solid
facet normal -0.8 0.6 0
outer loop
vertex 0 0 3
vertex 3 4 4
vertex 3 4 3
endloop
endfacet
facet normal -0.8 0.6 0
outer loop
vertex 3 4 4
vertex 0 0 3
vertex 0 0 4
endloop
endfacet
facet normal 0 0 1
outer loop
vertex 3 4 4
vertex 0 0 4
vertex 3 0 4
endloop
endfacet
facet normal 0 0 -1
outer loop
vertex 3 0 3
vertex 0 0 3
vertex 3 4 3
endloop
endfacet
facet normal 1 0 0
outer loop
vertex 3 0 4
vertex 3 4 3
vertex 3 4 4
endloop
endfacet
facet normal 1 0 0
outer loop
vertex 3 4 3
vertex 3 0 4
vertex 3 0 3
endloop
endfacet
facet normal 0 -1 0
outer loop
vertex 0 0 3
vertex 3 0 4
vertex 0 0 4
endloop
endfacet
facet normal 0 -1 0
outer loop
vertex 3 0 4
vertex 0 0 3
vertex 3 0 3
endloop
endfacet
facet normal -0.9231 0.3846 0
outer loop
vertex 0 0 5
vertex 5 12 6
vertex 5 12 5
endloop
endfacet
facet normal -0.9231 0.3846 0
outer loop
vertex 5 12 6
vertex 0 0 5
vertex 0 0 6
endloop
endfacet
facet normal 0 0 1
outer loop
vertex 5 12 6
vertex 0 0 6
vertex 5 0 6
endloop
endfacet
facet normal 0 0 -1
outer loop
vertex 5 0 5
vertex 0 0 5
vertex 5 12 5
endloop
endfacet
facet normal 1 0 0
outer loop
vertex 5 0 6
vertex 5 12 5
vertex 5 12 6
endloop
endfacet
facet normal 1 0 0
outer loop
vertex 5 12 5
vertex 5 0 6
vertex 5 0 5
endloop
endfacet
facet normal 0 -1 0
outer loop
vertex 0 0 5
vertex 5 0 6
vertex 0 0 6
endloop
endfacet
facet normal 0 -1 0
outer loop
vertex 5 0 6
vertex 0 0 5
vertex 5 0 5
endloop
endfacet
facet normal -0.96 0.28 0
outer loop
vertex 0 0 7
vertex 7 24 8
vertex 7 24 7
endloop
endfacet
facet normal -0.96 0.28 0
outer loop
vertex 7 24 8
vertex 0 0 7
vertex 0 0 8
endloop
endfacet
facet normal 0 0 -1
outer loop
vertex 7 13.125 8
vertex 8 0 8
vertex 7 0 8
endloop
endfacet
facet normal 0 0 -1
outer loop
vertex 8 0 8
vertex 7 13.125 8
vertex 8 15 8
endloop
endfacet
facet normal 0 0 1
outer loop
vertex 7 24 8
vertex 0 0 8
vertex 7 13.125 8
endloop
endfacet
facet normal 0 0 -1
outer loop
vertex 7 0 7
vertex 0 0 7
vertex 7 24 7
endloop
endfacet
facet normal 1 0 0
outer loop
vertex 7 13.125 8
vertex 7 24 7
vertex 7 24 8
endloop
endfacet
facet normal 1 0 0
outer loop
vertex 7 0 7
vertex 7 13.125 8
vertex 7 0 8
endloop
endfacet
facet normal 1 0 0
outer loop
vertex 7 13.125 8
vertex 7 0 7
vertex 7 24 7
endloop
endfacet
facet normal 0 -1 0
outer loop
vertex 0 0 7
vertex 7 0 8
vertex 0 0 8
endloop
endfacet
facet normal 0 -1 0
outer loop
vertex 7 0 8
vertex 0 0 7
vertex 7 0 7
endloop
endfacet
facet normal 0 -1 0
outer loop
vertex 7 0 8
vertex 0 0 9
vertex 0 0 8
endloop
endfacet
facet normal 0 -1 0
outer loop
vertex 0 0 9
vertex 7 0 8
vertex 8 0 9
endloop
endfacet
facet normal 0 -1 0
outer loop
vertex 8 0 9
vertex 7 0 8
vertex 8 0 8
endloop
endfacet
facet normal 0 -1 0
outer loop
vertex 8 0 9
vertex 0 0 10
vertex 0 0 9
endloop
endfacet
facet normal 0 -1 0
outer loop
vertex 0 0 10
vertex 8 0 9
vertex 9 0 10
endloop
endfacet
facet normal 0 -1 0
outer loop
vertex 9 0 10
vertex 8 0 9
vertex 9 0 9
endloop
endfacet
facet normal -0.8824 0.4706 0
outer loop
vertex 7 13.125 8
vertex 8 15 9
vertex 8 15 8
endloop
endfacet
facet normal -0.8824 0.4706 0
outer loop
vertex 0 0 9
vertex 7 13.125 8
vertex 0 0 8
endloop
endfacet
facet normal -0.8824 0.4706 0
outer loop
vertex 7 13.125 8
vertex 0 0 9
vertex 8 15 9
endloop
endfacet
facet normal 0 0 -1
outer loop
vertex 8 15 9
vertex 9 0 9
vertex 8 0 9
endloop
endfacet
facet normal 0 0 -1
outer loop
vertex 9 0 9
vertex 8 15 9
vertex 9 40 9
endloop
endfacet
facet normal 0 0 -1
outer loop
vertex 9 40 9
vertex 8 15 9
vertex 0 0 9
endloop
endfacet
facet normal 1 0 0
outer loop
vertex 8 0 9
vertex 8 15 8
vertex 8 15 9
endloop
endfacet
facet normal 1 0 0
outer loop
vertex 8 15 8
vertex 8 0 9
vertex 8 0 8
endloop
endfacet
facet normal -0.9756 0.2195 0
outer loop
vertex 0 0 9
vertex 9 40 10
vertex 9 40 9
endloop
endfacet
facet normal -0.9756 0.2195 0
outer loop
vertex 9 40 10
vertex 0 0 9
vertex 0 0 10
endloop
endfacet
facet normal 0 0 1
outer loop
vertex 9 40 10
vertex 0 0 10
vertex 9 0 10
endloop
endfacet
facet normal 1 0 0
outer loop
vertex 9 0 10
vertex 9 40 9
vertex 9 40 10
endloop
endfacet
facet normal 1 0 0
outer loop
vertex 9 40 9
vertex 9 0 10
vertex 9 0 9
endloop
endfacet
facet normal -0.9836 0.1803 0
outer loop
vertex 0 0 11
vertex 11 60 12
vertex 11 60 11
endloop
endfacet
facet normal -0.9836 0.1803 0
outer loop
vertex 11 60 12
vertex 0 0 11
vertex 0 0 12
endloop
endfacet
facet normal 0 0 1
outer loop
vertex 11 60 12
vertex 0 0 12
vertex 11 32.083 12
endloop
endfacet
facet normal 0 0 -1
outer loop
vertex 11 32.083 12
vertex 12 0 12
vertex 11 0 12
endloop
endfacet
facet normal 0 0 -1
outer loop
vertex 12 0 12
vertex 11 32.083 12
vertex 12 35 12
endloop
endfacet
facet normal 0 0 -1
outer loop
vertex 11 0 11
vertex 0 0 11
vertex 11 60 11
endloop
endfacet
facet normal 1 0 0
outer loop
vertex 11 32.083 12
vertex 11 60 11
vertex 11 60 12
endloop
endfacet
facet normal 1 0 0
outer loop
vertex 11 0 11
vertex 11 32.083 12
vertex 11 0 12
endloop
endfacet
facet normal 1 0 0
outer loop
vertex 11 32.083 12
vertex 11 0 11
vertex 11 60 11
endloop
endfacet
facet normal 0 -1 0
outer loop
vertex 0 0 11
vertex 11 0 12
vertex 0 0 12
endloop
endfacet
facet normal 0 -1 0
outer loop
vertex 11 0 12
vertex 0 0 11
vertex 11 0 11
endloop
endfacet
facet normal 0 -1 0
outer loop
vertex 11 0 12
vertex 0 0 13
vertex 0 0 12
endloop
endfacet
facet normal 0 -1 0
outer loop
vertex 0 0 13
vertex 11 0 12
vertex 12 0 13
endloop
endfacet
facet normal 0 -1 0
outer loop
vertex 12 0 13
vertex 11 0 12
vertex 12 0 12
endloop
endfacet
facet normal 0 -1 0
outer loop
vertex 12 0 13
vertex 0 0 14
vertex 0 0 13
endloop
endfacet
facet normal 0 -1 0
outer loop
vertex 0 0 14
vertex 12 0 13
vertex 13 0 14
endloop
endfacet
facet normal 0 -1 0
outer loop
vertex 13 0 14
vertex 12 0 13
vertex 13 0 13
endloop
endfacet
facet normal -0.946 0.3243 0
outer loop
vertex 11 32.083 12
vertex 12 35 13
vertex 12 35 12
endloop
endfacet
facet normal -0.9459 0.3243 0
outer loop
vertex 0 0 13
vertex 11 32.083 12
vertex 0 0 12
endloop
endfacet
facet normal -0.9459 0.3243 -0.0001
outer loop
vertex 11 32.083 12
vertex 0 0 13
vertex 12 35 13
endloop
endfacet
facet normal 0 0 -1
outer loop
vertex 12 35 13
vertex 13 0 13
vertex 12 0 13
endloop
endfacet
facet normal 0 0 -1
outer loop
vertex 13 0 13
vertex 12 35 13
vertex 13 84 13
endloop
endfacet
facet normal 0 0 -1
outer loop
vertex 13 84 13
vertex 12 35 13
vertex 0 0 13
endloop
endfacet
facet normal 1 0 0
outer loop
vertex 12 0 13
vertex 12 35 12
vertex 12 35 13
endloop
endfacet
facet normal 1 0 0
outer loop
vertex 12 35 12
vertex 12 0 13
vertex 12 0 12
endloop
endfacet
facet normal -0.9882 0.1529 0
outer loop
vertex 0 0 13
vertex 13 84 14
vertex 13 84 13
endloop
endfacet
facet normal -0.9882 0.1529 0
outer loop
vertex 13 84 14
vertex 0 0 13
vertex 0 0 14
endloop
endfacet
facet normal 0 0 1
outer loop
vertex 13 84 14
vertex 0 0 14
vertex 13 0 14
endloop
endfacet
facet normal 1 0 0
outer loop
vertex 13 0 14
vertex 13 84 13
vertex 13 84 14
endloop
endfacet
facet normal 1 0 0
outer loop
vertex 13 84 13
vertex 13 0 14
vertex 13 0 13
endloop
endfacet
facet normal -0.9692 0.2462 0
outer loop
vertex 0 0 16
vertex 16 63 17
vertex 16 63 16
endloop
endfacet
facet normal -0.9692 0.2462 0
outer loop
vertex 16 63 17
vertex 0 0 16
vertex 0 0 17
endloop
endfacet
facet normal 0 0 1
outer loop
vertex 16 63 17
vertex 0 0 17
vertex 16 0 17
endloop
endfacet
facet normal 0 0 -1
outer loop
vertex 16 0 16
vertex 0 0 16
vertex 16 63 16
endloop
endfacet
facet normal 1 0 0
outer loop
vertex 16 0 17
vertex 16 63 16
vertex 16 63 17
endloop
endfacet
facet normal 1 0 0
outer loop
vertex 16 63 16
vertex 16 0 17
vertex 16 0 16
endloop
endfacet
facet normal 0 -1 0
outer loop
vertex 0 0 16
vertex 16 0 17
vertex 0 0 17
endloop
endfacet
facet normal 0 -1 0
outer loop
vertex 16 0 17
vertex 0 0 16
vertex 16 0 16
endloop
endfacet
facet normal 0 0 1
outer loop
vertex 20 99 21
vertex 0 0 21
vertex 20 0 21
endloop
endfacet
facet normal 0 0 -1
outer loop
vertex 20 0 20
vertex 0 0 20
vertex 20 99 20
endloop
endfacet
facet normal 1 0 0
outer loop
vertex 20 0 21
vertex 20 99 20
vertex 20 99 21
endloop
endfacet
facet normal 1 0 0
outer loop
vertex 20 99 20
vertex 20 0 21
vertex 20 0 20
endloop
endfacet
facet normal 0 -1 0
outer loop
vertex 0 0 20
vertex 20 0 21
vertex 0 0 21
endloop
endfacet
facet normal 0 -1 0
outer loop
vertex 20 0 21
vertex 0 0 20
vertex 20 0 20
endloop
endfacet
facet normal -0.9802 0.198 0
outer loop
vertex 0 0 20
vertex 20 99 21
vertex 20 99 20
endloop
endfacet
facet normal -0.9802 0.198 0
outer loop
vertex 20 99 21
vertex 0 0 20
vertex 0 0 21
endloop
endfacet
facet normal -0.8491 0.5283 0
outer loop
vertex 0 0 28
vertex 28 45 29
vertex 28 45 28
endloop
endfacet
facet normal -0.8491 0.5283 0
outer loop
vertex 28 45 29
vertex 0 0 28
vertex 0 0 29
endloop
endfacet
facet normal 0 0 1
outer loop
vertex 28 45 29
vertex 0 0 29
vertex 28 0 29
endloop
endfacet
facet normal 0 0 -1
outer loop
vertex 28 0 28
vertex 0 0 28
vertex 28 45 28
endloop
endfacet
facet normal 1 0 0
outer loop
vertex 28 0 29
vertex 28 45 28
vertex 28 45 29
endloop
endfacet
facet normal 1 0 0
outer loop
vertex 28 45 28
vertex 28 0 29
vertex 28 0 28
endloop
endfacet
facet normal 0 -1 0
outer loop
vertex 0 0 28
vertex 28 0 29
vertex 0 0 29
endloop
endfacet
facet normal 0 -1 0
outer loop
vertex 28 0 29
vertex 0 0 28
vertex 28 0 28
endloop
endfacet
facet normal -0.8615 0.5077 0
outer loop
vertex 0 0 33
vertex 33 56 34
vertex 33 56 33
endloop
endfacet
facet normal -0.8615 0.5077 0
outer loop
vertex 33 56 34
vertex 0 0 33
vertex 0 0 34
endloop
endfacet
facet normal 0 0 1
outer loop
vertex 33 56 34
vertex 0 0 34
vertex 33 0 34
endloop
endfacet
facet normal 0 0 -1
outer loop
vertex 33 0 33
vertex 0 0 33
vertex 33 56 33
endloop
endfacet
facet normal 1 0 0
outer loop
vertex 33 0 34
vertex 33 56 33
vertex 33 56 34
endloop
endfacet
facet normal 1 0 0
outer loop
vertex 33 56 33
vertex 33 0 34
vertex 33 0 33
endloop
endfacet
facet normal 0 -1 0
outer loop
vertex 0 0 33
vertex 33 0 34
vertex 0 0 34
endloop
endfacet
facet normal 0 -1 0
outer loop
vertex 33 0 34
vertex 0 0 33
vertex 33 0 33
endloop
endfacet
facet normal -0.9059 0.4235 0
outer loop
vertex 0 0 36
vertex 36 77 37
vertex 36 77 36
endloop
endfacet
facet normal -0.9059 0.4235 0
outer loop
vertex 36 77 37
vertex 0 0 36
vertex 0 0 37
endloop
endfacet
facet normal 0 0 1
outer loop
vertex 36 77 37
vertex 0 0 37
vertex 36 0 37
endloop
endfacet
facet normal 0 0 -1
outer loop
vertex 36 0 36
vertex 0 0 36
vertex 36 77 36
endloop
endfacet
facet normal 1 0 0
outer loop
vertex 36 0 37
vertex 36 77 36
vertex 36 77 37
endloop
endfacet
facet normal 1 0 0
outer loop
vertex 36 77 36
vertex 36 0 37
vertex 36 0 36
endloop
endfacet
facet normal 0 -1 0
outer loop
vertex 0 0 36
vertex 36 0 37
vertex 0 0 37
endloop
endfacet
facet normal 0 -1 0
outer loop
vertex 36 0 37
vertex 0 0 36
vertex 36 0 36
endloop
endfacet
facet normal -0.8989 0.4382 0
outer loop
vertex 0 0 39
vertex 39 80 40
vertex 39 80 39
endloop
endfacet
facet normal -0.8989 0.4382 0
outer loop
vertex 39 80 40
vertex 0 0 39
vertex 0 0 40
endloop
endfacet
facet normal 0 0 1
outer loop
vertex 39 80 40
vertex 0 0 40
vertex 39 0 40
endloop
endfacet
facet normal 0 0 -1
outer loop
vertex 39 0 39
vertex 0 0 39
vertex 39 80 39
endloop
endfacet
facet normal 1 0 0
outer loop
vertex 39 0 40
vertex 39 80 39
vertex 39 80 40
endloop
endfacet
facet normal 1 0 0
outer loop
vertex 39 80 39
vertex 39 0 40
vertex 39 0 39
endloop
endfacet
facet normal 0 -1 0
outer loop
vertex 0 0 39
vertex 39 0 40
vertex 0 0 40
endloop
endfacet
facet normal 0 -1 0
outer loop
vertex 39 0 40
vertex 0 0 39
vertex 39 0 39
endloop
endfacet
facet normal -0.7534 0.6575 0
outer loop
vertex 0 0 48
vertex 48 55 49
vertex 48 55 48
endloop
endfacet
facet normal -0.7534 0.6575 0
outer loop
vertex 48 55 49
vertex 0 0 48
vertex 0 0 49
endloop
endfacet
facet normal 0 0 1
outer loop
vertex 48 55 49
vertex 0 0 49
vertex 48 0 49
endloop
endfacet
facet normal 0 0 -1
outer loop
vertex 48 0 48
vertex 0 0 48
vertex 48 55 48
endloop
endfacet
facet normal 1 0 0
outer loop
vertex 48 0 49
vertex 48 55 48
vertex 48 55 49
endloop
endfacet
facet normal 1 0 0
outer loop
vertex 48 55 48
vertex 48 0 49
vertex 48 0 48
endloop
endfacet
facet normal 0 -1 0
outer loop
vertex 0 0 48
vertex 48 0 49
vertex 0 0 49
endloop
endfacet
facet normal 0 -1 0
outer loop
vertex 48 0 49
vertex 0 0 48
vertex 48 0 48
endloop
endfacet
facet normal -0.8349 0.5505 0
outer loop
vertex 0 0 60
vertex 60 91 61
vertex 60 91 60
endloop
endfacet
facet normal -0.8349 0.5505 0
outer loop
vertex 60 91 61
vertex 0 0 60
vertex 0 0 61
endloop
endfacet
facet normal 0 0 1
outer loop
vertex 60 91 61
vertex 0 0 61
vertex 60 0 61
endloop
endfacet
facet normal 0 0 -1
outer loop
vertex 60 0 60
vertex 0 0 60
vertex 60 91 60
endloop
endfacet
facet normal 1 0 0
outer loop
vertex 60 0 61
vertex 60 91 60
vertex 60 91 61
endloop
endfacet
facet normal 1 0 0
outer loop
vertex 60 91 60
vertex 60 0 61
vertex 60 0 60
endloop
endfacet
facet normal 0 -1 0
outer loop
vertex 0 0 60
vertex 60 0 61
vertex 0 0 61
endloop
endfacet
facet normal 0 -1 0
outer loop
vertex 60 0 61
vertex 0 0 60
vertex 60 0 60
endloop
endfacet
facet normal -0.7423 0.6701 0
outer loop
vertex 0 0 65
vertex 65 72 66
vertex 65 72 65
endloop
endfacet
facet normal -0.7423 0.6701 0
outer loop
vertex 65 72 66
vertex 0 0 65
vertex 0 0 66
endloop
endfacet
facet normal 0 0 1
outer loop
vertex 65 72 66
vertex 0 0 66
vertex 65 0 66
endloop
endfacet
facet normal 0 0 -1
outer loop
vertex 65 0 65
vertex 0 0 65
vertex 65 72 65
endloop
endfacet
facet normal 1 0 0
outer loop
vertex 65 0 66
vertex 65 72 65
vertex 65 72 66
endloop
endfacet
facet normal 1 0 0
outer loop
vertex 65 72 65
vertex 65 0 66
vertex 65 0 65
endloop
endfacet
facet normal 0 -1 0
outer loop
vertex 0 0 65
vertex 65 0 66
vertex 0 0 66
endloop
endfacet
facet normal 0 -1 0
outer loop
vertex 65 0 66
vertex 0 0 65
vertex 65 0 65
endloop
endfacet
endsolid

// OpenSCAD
// Pythagorean Triples

test_module="test pythagorean_triples";

function calc_factors(N) = [ for(i=[1:N]) if(N%i==0) i ];
    
function calc_common_factors(a,b) = [ for(fa=calc_factors(a),fb=calc_factors(b)) if(fa==fb) fa ];
    
function pythagorean_triples(N=10) = [ for (i=[1:N],j=[i:N]) if(len(calc_common_factors(i,j))==1 && sqrt(pow(i,2)+pow(j,2))%1==0) [i,j] ];
    
function pythagorean_triples_angles(N=10) = [ for (pair=pythagorean_triples(N=N)) [ atan2(pair[0],pair[1]),atan2(pair[1],pair[0]) ] ];
    
if(test_module=="test pythagorean_triples") {
    for(pair=pythagorean_triples(N=100)) {
        echo(str("Factors of ",pair[0],": ",calc_factors(pair[0])));
        echo(str("  Factors of ",pair[1],": ",calc_factors(pair[1])));
        echo(str("  Common Factors: ",calc_common_factors(pair[0],pair[1])));
        echo(str("  atan2(",pair[0],",",pair[1],") = ",atan2(pair[0],pair[1])));
        echo(str("  atan2(",pair[1],",",pair[0],") = ",atan2(pair[1],pair[0])));
        echo(str("  ",pair[0],"^2 + ",pair[1],"^2 = ",sqrt(pow(pair[0],2)+pow(pair[1],2)),"^2 = ",pow(pair[0],2)+pow(pair[1],2)));
        translate([0,0,pair[0]]) intersection() {
            hull() {
                rotate([0,0,-90]) cube([1,pair[0],1]);
                translate([pair[0],0,0]) cube([1,pair[1],1]);
            }
            cube([pair[0],pair[1],1]);
        }
    }
}
